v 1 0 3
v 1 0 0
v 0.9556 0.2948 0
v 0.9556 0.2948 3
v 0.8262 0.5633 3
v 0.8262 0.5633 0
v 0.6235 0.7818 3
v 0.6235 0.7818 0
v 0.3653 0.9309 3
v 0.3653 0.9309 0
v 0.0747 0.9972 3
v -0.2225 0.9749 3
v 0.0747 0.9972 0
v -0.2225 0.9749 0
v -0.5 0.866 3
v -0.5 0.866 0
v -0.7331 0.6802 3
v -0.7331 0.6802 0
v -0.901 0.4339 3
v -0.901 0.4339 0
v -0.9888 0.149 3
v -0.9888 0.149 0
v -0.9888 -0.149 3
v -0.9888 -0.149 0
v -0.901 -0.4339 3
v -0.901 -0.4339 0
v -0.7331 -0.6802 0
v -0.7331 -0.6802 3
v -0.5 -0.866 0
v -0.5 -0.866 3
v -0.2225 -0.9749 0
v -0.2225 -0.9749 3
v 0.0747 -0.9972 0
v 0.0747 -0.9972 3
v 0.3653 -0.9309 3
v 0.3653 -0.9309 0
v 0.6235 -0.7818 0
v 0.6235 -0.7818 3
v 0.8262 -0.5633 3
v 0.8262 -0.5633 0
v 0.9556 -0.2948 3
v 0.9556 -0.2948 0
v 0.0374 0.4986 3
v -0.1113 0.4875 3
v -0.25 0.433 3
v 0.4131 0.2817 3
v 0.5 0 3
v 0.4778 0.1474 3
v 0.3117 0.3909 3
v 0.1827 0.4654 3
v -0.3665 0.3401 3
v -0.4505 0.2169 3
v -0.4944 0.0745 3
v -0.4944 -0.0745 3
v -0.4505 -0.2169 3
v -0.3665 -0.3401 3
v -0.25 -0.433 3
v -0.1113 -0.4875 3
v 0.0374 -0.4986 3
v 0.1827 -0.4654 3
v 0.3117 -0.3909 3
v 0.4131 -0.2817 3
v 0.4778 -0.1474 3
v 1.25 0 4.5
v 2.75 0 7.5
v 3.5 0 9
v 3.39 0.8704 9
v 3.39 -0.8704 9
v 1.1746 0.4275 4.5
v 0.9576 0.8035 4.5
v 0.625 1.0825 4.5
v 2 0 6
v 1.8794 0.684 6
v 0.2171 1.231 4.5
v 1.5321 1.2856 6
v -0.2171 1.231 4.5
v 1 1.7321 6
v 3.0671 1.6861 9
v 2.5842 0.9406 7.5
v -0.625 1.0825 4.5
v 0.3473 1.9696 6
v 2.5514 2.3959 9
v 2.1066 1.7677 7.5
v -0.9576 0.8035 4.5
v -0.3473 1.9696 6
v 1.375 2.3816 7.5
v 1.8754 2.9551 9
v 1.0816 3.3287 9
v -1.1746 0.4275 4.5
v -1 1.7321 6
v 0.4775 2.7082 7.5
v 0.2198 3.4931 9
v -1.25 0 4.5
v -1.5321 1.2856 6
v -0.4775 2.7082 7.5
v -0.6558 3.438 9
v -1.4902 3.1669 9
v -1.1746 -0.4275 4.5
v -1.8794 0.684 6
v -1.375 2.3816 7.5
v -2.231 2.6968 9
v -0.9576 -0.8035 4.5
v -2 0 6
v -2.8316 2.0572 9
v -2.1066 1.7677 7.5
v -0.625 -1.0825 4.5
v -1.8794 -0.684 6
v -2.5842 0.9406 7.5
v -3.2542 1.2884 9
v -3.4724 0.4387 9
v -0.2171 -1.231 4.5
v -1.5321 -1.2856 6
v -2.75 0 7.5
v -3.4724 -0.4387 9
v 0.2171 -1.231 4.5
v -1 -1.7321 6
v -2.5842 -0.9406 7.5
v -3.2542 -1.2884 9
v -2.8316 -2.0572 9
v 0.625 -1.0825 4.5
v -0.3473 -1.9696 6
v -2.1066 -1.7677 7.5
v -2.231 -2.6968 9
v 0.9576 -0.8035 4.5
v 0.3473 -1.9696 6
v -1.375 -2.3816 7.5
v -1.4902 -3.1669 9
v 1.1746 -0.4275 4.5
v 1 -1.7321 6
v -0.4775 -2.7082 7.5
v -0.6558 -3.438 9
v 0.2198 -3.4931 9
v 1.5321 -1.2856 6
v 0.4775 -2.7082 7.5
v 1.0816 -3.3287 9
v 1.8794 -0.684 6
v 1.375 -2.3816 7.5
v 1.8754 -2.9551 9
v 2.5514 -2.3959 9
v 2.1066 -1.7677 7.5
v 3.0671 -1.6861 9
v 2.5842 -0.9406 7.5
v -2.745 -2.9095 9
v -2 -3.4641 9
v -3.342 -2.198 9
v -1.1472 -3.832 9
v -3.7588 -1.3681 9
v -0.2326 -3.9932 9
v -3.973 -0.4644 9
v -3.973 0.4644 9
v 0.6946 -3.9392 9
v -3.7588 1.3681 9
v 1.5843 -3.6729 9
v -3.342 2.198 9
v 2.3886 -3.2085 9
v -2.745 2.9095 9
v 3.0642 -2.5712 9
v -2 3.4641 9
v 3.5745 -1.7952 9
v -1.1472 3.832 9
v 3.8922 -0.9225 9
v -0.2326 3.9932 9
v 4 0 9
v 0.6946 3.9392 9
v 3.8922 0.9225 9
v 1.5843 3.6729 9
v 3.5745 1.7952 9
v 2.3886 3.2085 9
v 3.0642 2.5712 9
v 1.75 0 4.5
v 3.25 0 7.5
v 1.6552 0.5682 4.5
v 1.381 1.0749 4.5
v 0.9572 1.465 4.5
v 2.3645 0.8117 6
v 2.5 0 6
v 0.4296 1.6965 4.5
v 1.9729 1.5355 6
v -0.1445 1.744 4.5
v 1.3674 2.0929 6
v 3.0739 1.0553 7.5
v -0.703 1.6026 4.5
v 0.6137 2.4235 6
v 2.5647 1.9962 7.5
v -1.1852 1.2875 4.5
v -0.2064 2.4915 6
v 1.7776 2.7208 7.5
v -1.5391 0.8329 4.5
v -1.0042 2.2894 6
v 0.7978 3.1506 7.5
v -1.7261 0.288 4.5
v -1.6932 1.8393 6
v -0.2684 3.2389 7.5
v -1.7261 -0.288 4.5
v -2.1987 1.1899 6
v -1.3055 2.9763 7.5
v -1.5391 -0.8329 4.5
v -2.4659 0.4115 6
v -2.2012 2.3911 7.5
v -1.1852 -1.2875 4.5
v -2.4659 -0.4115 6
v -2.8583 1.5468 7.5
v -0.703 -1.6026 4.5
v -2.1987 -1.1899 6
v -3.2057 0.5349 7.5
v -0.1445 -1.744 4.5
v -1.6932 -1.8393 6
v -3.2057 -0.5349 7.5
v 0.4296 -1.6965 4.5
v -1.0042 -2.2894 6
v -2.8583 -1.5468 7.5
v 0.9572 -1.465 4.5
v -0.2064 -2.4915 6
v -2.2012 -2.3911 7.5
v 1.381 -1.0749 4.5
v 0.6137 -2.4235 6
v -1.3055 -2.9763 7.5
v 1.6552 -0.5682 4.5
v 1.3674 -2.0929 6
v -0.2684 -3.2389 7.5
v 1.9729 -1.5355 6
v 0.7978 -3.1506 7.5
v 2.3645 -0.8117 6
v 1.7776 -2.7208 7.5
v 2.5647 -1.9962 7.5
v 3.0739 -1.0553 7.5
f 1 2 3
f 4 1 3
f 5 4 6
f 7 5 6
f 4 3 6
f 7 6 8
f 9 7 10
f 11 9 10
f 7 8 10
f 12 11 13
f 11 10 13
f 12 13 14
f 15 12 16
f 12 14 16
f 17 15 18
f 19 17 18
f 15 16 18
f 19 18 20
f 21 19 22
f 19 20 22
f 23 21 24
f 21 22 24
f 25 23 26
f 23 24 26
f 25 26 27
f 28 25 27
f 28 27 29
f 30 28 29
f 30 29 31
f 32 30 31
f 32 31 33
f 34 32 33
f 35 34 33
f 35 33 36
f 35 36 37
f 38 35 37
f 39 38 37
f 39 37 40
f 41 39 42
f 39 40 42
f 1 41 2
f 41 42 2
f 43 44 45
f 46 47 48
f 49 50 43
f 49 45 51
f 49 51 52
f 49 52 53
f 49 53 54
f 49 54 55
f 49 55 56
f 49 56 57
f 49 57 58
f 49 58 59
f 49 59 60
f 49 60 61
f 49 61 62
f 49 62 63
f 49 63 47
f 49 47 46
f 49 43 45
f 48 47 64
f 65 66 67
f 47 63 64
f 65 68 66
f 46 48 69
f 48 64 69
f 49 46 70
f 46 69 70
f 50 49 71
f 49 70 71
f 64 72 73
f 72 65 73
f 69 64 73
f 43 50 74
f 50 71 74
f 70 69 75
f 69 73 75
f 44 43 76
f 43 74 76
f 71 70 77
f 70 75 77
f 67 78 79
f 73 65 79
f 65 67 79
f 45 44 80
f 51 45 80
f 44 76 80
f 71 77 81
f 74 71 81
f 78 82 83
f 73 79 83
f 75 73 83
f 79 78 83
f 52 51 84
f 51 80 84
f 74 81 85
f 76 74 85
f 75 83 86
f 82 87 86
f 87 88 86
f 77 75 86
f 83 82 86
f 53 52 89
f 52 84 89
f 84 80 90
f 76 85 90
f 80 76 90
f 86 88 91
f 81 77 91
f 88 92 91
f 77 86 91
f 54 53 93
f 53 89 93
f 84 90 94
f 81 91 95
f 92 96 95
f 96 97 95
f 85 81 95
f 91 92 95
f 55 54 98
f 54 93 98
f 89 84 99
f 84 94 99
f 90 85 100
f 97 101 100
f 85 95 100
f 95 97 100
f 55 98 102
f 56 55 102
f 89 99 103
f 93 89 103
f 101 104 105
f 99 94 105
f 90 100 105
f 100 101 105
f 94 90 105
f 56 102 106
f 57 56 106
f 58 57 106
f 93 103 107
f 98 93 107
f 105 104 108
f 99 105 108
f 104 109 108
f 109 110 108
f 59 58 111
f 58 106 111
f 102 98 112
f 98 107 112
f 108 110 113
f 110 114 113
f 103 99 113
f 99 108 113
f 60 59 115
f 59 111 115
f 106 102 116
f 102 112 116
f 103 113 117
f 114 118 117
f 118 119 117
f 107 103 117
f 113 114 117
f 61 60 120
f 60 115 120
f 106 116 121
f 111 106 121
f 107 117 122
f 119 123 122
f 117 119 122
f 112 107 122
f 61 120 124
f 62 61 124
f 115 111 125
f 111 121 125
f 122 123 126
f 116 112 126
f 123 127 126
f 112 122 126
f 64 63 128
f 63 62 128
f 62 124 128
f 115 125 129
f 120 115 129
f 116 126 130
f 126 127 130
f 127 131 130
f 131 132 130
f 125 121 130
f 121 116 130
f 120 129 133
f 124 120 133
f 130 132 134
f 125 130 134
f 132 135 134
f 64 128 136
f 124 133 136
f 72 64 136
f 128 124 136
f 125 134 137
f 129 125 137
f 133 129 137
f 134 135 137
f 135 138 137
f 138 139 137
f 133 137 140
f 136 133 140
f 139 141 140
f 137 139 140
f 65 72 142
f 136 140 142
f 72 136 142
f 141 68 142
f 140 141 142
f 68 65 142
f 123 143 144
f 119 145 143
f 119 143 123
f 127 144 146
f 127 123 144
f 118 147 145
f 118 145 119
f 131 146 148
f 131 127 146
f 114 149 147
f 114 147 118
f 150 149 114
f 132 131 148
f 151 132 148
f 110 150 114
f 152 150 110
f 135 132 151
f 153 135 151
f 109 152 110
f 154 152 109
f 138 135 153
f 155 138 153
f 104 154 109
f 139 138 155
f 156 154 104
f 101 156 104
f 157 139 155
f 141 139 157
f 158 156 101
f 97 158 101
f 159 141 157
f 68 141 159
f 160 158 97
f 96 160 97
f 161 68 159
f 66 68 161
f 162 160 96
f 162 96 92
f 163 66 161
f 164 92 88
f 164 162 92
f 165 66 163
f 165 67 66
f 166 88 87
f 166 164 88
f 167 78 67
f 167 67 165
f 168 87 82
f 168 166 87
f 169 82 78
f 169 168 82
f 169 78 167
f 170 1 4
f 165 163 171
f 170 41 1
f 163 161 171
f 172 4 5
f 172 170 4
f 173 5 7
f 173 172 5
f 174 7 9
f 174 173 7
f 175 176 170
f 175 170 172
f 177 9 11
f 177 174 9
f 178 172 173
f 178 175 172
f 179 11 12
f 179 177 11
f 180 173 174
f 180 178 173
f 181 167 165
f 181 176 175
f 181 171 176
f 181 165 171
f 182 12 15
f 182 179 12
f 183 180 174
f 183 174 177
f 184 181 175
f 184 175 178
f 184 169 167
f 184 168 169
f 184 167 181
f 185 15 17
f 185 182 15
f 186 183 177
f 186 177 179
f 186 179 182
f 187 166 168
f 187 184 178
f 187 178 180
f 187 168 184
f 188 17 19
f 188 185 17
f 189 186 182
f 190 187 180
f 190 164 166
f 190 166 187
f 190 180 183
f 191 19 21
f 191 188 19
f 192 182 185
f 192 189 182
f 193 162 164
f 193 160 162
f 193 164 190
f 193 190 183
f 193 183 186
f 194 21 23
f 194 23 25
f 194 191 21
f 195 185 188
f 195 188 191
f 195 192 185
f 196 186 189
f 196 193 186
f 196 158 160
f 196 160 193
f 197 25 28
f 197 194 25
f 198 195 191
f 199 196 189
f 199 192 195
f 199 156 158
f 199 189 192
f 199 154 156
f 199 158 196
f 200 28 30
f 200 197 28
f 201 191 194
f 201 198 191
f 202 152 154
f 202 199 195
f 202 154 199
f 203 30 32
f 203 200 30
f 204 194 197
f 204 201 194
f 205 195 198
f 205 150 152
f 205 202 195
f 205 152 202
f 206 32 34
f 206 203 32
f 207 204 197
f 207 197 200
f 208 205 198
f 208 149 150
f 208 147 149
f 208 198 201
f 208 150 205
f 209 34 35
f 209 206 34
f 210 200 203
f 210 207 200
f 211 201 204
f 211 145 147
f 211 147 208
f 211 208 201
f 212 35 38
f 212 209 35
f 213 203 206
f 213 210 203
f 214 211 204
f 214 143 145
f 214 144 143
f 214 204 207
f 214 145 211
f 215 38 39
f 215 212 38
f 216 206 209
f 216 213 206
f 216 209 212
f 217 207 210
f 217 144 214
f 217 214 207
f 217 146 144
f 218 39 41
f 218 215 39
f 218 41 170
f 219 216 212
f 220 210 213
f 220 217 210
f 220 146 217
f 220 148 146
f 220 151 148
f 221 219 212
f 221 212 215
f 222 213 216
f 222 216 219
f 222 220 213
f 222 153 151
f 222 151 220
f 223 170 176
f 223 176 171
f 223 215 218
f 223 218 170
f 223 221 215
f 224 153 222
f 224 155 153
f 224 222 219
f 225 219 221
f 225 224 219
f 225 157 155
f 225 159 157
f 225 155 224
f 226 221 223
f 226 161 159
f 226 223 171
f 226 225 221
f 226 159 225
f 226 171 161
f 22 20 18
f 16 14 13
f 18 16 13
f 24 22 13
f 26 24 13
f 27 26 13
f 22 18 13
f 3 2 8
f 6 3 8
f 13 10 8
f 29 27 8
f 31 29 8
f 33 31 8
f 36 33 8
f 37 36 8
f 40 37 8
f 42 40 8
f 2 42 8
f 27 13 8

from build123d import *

# Parameters (mm, degrees)
CYLINDER_R        = 1
CYLINDER_DEPTH    = 3
CYLINDER001_R     = 0.5
CYLINDER001_DEPTH = 3


with BuildPart() as cone001:
    # Cone001 → Cone001 (revolve)
    with BuildSketch(Plane(origin=(0, 0, 3), x_dir=(1, 0, 0), z_dir=(0, -1, 0))):
        Polygon((0, 0), (0.5, 0), (3.5, 6), (0, 6), align=None)
    revolve(axis=Axis((0, 0, 3), (0, 0, 1)))


with BuildPart() as cut001:
    # Cone → Cone (revolve)
    with BuildSketch(Plane(origin=(0, 0, 3), x_dir=(1, 0, 0), z_dir=(0, -1, 0))):
        Polygon((0, 0), (1, 0), (4, 6), (0, 6), align=None)
    revolve(axis=Axis((0, 0, 3), (0, 0, 1)))

    # Cut001: cut Cone001
    add(cone001.part, mode=Mode.SUBTRACT)


with BuildPart() as cylinder:
    # Cylinder → Cylinder (new body)
    with BuildSketch(Plane.XY):
        Circle(CYLINDER_R)
    extrude(amount=CYLINDER_DEPTH)


with BuildPart() as cylinder001:
    # Cylinder001 → Cylinder001 (new body)
    with BuildSketch(Plane.XY):
        Circle(CYLINDER001_R)
    extrude(amount=CYLINDER001_DEPTH)


with BuildPart() as fusion:
    # Cut base: copy of Cylinder
    add(cylinder.part)

    # Cut: cut Cylinder001
    add(cylinder001.part, mode=Mode.SUBTRACT)

    # Fusion: union Cut001, Cylinder, Cylinder001
    add(cut001.part)
    add(cylinder.part)
    add(cylinder001.part)


solid = fusion.part
